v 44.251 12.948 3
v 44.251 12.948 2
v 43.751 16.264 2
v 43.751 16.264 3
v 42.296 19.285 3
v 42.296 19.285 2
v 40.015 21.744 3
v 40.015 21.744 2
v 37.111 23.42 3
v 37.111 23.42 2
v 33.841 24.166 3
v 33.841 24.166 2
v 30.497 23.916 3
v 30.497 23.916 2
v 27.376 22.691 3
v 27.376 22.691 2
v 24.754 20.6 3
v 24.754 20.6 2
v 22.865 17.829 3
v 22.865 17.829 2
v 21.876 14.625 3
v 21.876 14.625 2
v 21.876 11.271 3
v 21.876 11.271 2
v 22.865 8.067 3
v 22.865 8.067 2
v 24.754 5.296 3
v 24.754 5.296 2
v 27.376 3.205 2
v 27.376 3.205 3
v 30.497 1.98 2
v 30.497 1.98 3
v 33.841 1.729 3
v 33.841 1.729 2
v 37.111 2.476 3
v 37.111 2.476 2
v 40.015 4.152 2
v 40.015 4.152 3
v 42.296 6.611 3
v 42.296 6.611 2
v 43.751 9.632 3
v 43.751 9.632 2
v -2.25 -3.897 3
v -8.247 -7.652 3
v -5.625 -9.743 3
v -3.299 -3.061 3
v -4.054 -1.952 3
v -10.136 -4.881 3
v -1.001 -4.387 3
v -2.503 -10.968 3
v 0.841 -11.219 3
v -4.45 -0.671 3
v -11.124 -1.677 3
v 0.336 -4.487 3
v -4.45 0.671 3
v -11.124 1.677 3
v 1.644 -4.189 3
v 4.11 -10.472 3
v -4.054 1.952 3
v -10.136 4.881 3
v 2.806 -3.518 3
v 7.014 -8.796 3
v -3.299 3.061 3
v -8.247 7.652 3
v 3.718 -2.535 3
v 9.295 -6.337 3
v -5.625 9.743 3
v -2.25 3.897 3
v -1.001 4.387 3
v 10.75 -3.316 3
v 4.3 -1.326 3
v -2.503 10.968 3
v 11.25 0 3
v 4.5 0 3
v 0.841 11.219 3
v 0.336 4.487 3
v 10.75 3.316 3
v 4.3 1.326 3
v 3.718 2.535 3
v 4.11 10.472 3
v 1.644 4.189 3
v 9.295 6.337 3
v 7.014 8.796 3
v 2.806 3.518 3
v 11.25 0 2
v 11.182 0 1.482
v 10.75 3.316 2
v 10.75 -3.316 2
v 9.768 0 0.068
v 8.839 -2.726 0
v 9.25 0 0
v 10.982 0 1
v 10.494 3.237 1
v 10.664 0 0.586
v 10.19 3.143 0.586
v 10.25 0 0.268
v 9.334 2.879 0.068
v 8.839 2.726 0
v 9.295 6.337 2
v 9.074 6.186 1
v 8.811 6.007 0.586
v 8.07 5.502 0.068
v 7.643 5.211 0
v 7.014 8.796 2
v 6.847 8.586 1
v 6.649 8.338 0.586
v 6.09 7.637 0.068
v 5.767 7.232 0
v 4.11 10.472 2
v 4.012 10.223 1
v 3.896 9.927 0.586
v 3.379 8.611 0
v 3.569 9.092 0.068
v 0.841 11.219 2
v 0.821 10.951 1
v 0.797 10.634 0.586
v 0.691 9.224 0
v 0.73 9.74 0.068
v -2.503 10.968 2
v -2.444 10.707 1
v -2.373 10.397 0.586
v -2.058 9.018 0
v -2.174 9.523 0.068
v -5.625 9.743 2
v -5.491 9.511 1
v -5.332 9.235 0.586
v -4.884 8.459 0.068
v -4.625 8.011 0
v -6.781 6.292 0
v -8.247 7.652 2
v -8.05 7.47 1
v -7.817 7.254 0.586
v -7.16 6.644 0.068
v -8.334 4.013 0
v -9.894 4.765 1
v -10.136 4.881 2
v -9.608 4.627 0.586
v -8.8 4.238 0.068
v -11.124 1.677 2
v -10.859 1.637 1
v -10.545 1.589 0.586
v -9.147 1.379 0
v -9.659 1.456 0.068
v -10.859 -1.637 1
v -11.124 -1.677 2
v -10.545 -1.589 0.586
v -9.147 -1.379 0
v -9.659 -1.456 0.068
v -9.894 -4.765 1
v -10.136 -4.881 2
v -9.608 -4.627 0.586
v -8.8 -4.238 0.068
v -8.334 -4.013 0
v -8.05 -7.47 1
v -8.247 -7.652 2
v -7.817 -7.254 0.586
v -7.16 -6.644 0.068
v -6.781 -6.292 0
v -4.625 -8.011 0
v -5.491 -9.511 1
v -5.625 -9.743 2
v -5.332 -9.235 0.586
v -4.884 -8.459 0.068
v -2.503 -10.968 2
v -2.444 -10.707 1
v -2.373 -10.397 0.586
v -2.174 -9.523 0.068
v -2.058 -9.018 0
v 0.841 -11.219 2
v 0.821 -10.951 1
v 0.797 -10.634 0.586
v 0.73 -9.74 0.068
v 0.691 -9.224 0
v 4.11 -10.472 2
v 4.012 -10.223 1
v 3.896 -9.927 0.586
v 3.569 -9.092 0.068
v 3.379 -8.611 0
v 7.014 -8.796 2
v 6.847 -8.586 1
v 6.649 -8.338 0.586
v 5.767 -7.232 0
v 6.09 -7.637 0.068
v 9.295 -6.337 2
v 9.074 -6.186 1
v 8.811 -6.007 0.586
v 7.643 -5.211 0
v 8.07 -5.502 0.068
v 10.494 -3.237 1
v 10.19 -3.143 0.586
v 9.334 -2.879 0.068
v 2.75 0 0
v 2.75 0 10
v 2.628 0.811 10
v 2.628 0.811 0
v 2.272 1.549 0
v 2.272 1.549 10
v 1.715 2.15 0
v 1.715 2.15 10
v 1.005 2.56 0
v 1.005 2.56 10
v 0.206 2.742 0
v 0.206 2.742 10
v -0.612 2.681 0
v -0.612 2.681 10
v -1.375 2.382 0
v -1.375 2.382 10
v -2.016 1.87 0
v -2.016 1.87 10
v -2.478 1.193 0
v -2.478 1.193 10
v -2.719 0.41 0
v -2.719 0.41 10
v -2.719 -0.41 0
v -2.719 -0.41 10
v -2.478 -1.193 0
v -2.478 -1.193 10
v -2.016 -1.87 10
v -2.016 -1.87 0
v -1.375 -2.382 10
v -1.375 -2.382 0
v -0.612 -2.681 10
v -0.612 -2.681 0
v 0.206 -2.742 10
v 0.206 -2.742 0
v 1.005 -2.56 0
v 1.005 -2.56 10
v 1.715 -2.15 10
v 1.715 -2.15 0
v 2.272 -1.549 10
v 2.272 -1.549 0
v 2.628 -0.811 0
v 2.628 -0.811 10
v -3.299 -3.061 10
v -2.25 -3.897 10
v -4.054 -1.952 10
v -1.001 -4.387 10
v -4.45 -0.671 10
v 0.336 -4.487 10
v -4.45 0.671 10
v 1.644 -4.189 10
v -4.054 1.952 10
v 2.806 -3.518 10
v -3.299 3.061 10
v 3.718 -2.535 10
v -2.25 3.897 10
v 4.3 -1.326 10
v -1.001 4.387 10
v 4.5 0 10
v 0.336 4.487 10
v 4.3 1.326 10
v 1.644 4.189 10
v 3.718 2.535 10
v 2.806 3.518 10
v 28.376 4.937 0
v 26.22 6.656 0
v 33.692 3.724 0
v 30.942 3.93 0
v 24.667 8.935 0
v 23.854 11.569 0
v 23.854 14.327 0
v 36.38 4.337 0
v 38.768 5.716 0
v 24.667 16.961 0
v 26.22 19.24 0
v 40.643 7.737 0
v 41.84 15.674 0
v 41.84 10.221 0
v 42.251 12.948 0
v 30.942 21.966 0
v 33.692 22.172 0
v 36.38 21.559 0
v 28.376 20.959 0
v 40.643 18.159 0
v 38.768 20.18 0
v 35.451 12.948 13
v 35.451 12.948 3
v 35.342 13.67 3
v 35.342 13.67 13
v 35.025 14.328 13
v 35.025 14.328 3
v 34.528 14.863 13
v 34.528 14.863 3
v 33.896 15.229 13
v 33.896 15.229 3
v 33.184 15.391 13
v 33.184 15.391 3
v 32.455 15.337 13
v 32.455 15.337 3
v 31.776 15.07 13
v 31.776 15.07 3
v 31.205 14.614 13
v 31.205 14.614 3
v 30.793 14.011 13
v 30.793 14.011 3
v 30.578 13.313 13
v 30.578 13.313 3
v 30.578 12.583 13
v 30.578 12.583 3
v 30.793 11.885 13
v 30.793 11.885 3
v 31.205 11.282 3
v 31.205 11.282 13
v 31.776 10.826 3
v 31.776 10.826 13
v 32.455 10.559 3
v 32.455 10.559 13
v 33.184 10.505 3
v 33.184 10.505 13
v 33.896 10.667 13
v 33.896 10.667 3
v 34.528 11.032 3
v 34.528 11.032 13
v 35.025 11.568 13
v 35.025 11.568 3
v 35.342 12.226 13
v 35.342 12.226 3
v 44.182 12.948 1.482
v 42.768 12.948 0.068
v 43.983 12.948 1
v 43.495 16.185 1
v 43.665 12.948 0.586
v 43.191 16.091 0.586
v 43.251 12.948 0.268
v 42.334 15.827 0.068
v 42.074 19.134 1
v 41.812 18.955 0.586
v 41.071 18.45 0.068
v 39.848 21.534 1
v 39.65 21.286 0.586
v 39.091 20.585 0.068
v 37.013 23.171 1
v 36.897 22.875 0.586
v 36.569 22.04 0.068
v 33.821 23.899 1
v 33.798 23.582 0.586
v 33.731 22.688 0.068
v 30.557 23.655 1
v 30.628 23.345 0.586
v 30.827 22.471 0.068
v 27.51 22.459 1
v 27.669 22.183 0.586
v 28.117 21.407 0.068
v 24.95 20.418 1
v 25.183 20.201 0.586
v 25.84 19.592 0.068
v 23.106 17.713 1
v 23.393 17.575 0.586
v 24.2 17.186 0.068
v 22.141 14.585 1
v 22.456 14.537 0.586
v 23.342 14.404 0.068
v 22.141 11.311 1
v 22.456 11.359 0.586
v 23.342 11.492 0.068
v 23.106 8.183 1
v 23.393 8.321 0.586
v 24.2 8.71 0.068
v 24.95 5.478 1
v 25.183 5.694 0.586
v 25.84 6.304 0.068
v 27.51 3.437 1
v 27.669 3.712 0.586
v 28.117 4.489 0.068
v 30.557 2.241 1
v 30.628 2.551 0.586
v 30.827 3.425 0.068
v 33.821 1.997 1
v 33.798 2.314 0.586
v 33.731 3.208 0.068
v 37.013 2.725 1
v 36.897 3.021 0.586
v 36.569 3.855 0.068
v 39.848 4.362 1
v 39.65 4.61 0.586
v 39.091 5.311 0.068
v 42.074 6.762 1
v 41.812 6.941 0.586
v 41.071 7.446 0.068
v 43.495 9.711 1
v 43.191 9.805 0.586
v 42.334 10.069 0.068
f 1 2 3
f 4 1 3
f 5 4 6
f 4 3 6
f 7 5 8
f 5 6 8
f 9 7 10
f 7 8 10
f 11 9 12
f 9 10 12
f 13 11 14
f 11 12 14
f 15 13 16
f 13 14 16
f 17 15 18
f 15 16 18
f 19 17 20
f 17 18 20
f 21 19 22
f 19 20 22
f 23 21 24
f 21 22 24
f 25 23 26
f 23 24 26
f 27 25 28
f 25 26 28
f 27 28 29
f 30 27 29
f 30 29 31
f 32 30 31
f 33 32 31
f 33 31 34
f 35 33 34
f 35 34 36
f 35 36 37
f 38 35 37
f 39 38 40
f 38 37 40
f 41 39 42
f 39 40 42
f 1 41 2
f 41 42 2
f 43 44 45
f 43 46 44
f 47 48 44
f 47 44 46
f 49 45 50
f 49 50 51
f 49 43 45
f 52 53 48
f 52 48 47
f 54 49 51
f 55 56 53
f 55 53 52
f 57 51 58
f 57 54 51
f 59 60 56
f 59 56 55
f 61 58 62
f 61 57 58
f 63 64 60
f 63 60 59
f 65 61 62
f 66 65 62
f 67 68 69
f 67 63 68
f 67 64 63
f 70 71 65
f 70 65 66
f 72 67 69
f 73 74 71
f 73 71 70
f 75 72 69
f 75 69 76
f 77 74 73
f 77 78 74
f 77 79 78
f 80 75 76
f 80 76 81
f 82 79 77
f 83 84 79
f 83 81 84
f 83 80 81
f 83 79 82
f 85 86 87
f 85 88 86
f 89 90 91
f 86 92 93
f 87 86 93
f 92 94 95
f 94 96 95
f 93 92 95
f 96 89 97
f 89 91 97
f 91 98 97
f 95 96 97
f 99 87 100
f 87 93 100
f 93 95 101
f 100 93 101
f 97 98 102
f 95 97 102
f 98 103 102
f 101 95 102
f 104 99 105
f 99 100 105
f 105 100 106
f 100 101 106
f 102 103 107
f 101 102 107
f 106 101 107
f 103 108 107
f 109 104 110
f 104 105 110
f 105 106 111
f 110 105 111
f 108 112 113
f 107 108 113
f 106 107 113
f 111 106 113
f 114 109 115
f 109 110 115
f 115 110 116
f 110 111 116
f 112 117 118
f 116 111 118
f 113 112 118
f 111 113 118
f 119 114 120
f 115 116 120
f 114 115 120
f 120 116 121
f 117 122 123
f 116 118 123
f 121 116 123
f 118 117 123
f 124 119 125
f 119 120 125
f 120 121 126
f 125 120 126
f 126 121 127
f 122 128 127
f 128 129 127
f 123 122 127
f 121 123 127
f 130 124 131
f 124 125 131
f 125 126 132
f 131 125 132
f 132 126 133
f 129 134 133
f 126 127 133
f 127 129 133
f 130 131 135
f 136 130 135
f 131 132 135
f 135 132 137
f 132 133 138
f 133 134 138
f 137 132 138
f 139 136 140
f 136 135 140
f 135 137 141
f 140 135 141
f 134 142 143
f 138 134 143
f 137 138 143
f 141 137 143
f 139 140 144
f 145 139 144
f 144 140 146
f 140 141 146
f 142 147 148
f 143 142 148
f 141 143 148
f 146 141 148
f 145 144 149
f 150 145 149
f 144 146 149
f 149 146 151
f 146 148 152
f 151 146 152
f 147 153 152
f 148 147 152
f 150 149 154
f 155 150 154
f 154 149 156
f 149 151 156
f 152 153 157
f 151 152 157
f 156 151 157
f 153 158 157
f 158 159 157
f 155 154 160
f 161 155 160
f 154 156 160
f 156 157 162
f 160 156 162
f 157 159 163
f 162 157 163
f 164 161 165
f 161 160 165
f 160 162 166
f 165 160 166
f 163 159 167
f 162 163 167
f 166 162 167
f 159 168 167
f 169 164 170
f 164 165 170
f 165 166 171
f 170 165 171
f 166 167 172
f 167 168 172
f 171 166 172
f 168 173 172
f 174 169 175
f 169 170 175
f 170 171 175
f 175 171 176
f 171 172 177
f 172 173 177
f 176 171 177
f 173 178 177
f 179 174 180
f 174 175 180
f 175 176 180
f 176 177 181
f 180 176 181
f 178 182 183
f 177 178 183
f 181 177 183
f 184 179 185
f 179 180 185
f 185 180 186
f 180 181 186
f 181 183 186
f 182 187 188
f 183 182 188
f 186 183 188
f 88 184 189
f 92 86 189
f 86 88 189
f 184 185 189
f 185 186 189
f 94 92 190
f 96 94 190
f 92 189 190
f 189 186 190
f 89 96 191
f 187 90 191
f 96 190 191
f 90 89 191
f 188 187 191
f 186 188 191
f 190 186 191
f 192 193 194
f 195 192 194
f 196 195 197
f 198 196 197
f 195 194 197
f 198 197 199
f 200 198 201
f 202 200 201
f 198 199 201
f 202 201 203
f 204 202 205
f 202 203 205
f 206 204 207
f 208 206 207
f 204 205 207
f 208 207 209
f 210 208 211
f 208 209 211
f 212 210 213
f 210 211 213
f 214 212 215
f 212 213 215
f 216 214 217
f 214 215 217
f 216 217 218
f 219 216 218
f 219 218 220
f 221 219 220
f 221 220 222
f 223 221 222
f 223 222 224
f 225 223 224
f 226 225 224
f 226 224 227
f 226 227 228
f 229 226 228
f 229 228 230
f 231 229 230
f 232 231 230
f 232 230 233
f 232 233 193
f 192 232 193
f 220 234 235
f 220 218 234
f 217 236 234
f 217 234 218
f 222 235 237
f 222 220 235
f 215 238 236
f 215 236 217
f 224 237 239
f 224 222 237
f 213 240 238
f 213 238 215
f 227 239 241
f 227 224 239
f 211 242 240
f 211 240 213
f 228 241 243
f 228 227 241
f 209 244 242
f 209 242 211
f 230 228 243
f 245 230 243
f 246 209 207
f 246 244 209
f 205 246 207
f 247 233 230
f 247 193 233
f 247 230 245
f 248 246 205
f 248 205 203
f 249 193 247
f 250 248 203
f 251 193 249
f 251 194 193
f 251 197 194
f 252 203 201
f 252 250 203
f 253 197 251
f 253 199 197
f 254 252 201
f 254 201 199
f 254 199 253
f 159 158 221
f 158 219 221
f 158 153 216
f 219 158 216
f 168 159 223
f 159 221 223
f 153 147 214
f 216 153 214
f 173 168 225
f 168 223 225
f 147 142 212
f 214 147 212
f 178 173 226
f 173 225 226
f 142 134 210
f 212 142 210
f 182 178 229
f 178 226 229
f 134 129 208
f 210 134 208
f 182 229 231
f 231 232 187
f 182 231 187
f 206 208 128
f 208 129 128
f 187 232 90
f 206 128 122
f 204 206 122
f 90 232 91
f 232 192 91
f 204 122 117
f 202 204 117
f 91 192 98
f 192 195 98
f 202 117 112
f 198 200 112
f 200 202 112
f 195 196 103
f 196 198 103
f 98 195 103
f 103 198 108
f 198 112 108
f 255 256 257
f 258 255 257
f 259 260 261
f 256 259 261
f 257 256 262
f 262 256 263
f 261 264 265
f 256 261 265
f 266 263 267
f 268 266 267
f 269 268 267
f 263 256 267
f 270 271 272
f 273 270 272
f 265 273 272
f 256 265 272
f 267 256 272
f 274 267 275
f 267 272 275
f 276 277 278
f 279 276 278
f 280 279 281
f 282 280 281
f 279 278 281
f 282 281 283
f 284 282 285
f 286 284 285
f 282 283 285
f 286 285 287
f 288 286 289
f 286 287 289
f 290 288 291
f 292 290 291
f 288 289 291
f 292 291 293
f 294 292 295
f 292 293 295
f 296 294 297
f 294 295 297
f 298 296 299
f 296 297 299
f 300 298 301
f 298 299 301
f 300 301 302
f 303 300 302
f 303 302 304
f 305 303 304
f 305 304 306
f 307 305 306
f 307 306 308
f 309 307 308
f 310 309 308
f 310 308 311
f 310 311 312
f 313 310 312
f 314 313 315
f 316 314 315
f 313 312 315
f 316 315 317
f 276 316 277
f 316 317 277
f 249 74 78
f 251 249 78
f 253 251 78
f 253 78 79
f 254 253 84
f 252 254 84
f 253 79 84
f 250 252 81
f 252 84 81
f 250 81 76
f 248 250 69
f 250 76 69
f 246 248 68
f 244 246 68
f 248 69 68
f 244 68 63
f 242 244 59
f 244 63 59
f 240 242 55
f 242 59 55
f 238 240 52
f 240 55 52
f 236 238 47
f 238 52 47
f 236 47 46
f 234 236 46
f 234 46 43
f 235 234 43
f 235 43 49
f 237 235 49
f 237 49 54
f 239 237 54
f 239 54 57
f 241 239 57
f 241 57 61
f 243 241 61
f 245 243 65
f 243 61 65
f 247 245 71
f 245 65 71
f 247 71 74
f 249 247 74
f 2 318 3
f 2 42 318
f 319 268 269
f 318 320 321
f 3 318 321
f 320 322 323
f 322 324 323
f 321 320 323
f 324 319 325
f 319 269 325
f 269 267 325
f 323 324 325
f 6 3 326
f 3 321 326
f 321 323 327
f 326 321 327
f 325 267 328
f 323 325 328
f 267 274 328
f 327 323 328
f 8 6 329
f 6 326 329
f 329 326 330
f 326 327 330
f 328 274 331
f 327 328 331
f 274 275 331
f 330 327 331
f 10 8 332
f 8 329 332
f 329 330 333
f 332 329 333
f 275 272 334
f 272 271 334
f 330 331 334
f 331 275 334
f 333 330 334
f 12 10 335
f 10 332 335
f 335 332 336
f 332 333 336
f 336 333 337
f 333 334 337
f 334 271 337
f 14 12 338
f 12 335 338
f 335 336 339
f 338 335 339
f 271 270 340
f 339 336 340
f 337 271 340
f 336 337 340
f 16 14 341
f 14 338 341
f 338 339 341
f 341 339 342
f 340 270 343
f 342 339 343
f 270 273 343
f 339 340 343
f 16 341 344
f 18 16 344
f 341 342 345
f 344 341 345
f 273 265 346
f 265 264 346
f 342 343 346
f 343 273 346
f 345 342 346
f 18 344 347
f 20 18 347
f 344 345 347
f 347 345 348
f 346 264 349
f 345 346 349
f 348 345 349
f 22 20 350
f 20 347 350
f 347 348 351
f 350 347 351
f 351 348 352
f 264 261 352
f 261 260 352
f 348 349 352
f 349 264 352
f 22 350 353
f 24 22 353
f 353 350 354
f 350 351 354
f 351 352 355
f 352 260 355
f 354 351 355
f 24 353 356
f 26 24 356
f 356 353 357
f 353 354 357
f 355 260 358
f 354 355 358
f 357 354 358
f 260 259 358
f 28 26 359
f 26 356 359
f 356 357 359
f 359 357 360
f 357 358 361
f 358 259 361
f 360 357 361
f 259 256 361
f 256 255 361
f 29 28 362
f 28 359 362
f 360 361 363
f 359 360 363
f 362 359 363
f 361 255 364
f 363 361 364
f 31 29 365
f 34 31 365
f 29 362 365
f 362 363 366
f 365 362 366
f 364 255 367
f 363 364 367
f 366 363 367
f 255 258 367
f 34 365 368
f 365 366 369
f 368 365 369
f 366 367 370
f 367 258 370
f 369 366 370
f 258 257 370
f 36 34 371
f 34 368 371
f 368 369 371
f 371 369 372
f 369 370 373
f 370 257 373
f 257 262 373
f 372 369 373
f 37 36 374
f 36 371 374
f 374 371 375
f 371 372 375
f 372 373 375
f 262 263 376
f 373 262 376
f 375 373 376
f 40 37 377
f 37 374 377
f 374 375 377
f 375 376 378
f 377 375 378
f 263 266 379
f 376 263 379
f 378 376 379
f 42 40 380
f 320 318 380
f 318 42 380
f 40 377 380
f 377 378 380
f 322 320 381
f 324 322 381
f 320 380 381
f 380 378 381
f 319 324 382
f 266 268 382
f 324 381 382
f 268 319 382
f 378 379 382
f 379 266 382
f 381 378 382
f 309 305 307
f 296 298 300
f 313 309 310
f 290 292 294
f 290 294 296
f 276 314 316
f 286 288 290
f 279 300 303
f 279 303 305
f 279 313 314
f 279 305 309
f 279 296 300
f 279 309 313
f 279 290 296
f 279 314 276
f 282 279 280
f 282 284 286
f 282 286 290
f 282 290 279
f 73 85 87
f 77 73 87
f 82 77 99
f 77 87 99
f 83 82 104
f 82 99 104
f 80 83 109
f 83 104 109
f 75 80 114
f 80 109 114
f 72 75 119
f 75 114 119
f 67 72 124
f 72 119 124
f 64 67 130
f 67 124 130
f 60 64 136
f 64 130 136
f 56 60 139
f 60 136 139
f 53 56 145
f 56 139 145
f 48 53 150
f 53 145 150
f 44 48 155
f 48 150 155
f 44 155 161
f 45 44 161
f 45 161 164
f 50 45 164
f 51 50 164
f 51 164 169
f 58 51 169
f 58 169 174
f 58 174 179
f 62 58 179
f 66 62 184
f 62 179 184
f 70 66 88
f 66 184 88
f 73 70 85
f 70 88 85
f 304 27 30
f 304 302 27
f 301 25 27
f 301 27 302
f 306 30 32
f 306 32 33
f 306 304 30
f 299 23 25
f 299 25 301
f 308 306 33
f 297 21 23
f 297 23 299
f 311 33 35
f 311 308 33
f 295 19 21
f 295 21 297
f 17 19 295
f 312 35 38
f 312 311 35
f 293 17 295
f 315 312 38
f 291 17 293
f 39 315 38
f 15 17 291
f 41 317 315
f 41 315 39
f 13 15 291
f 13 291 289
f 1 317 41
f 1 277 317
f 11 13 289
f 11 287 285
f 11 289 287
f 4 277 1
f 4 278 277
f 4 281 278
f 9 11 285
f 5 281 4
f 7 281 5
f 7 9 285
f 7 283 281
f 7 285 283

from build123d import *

# Parameters (mm, degrees)
F0_R     = 11.25
F1_DEPTH = 3
F2_R     = 4.5
F3_DEPTH = 7
F4_R     = 2.75
F5_DEPTH = 70.6
F6_R     = 11.25
F7_DEPTH = 3
F8_R     = 2.45
F9_DEPTH = 10
F10_R    = 2
F10_2_R  = 2


with BuildPart() as f1:
    # F0 (on Top) → F1 (new body)
    with BuildSketch(Plane.XY):
        Circle(F0_R)
    extrude(amount=F1_DEPTH)

    # F2 (on face) → F3 (join)
    with BuildSketch(Plane.XY.offset(3)):
        Circle(F2_R)
    extrude(amount=F3_DEPTH)

    # F4 (on face) → F5 (cut)
    with BuildSketch(Plane.XY.offset(10)):
        Circle(F4_R)
    extrude(amount=-F5_DEPTH, mode=Mode.SUBTRACT)

    # F10#2
    f10_2_edges = [f1.edges().sort_by_distance(p)[0] for p in [
        (-11.25, 0, 0),
    ]]
    fillet(f10_2_edges, radius=F10_2_R)


with BuildPart() as f7:
    # F6 (on Top) → F7 (new body)
    with BuildSketch(Plane.XY):
        with Locations((33.000633, 12.947934)):
            Circle(F6_R)
    extrude(amount=F7_DEPTH)

    # F8 (on face) → F9 (join)
    with BuildSketch(Plane.XY.offset(3)):
        with Locations((33.000633, 12.947934)):
            Circle(F8_R)
    extrude(amount=F9_DEPTH)

    # F10
    f10_edges = [f7.edges().sort_by_distance(p)[0] for p in [
        (21.750633, 12.947934, 0),
    ]]
    fillet(f10_edges, radius=F10_R)


solid = Compound([f1.part, f7.part])
